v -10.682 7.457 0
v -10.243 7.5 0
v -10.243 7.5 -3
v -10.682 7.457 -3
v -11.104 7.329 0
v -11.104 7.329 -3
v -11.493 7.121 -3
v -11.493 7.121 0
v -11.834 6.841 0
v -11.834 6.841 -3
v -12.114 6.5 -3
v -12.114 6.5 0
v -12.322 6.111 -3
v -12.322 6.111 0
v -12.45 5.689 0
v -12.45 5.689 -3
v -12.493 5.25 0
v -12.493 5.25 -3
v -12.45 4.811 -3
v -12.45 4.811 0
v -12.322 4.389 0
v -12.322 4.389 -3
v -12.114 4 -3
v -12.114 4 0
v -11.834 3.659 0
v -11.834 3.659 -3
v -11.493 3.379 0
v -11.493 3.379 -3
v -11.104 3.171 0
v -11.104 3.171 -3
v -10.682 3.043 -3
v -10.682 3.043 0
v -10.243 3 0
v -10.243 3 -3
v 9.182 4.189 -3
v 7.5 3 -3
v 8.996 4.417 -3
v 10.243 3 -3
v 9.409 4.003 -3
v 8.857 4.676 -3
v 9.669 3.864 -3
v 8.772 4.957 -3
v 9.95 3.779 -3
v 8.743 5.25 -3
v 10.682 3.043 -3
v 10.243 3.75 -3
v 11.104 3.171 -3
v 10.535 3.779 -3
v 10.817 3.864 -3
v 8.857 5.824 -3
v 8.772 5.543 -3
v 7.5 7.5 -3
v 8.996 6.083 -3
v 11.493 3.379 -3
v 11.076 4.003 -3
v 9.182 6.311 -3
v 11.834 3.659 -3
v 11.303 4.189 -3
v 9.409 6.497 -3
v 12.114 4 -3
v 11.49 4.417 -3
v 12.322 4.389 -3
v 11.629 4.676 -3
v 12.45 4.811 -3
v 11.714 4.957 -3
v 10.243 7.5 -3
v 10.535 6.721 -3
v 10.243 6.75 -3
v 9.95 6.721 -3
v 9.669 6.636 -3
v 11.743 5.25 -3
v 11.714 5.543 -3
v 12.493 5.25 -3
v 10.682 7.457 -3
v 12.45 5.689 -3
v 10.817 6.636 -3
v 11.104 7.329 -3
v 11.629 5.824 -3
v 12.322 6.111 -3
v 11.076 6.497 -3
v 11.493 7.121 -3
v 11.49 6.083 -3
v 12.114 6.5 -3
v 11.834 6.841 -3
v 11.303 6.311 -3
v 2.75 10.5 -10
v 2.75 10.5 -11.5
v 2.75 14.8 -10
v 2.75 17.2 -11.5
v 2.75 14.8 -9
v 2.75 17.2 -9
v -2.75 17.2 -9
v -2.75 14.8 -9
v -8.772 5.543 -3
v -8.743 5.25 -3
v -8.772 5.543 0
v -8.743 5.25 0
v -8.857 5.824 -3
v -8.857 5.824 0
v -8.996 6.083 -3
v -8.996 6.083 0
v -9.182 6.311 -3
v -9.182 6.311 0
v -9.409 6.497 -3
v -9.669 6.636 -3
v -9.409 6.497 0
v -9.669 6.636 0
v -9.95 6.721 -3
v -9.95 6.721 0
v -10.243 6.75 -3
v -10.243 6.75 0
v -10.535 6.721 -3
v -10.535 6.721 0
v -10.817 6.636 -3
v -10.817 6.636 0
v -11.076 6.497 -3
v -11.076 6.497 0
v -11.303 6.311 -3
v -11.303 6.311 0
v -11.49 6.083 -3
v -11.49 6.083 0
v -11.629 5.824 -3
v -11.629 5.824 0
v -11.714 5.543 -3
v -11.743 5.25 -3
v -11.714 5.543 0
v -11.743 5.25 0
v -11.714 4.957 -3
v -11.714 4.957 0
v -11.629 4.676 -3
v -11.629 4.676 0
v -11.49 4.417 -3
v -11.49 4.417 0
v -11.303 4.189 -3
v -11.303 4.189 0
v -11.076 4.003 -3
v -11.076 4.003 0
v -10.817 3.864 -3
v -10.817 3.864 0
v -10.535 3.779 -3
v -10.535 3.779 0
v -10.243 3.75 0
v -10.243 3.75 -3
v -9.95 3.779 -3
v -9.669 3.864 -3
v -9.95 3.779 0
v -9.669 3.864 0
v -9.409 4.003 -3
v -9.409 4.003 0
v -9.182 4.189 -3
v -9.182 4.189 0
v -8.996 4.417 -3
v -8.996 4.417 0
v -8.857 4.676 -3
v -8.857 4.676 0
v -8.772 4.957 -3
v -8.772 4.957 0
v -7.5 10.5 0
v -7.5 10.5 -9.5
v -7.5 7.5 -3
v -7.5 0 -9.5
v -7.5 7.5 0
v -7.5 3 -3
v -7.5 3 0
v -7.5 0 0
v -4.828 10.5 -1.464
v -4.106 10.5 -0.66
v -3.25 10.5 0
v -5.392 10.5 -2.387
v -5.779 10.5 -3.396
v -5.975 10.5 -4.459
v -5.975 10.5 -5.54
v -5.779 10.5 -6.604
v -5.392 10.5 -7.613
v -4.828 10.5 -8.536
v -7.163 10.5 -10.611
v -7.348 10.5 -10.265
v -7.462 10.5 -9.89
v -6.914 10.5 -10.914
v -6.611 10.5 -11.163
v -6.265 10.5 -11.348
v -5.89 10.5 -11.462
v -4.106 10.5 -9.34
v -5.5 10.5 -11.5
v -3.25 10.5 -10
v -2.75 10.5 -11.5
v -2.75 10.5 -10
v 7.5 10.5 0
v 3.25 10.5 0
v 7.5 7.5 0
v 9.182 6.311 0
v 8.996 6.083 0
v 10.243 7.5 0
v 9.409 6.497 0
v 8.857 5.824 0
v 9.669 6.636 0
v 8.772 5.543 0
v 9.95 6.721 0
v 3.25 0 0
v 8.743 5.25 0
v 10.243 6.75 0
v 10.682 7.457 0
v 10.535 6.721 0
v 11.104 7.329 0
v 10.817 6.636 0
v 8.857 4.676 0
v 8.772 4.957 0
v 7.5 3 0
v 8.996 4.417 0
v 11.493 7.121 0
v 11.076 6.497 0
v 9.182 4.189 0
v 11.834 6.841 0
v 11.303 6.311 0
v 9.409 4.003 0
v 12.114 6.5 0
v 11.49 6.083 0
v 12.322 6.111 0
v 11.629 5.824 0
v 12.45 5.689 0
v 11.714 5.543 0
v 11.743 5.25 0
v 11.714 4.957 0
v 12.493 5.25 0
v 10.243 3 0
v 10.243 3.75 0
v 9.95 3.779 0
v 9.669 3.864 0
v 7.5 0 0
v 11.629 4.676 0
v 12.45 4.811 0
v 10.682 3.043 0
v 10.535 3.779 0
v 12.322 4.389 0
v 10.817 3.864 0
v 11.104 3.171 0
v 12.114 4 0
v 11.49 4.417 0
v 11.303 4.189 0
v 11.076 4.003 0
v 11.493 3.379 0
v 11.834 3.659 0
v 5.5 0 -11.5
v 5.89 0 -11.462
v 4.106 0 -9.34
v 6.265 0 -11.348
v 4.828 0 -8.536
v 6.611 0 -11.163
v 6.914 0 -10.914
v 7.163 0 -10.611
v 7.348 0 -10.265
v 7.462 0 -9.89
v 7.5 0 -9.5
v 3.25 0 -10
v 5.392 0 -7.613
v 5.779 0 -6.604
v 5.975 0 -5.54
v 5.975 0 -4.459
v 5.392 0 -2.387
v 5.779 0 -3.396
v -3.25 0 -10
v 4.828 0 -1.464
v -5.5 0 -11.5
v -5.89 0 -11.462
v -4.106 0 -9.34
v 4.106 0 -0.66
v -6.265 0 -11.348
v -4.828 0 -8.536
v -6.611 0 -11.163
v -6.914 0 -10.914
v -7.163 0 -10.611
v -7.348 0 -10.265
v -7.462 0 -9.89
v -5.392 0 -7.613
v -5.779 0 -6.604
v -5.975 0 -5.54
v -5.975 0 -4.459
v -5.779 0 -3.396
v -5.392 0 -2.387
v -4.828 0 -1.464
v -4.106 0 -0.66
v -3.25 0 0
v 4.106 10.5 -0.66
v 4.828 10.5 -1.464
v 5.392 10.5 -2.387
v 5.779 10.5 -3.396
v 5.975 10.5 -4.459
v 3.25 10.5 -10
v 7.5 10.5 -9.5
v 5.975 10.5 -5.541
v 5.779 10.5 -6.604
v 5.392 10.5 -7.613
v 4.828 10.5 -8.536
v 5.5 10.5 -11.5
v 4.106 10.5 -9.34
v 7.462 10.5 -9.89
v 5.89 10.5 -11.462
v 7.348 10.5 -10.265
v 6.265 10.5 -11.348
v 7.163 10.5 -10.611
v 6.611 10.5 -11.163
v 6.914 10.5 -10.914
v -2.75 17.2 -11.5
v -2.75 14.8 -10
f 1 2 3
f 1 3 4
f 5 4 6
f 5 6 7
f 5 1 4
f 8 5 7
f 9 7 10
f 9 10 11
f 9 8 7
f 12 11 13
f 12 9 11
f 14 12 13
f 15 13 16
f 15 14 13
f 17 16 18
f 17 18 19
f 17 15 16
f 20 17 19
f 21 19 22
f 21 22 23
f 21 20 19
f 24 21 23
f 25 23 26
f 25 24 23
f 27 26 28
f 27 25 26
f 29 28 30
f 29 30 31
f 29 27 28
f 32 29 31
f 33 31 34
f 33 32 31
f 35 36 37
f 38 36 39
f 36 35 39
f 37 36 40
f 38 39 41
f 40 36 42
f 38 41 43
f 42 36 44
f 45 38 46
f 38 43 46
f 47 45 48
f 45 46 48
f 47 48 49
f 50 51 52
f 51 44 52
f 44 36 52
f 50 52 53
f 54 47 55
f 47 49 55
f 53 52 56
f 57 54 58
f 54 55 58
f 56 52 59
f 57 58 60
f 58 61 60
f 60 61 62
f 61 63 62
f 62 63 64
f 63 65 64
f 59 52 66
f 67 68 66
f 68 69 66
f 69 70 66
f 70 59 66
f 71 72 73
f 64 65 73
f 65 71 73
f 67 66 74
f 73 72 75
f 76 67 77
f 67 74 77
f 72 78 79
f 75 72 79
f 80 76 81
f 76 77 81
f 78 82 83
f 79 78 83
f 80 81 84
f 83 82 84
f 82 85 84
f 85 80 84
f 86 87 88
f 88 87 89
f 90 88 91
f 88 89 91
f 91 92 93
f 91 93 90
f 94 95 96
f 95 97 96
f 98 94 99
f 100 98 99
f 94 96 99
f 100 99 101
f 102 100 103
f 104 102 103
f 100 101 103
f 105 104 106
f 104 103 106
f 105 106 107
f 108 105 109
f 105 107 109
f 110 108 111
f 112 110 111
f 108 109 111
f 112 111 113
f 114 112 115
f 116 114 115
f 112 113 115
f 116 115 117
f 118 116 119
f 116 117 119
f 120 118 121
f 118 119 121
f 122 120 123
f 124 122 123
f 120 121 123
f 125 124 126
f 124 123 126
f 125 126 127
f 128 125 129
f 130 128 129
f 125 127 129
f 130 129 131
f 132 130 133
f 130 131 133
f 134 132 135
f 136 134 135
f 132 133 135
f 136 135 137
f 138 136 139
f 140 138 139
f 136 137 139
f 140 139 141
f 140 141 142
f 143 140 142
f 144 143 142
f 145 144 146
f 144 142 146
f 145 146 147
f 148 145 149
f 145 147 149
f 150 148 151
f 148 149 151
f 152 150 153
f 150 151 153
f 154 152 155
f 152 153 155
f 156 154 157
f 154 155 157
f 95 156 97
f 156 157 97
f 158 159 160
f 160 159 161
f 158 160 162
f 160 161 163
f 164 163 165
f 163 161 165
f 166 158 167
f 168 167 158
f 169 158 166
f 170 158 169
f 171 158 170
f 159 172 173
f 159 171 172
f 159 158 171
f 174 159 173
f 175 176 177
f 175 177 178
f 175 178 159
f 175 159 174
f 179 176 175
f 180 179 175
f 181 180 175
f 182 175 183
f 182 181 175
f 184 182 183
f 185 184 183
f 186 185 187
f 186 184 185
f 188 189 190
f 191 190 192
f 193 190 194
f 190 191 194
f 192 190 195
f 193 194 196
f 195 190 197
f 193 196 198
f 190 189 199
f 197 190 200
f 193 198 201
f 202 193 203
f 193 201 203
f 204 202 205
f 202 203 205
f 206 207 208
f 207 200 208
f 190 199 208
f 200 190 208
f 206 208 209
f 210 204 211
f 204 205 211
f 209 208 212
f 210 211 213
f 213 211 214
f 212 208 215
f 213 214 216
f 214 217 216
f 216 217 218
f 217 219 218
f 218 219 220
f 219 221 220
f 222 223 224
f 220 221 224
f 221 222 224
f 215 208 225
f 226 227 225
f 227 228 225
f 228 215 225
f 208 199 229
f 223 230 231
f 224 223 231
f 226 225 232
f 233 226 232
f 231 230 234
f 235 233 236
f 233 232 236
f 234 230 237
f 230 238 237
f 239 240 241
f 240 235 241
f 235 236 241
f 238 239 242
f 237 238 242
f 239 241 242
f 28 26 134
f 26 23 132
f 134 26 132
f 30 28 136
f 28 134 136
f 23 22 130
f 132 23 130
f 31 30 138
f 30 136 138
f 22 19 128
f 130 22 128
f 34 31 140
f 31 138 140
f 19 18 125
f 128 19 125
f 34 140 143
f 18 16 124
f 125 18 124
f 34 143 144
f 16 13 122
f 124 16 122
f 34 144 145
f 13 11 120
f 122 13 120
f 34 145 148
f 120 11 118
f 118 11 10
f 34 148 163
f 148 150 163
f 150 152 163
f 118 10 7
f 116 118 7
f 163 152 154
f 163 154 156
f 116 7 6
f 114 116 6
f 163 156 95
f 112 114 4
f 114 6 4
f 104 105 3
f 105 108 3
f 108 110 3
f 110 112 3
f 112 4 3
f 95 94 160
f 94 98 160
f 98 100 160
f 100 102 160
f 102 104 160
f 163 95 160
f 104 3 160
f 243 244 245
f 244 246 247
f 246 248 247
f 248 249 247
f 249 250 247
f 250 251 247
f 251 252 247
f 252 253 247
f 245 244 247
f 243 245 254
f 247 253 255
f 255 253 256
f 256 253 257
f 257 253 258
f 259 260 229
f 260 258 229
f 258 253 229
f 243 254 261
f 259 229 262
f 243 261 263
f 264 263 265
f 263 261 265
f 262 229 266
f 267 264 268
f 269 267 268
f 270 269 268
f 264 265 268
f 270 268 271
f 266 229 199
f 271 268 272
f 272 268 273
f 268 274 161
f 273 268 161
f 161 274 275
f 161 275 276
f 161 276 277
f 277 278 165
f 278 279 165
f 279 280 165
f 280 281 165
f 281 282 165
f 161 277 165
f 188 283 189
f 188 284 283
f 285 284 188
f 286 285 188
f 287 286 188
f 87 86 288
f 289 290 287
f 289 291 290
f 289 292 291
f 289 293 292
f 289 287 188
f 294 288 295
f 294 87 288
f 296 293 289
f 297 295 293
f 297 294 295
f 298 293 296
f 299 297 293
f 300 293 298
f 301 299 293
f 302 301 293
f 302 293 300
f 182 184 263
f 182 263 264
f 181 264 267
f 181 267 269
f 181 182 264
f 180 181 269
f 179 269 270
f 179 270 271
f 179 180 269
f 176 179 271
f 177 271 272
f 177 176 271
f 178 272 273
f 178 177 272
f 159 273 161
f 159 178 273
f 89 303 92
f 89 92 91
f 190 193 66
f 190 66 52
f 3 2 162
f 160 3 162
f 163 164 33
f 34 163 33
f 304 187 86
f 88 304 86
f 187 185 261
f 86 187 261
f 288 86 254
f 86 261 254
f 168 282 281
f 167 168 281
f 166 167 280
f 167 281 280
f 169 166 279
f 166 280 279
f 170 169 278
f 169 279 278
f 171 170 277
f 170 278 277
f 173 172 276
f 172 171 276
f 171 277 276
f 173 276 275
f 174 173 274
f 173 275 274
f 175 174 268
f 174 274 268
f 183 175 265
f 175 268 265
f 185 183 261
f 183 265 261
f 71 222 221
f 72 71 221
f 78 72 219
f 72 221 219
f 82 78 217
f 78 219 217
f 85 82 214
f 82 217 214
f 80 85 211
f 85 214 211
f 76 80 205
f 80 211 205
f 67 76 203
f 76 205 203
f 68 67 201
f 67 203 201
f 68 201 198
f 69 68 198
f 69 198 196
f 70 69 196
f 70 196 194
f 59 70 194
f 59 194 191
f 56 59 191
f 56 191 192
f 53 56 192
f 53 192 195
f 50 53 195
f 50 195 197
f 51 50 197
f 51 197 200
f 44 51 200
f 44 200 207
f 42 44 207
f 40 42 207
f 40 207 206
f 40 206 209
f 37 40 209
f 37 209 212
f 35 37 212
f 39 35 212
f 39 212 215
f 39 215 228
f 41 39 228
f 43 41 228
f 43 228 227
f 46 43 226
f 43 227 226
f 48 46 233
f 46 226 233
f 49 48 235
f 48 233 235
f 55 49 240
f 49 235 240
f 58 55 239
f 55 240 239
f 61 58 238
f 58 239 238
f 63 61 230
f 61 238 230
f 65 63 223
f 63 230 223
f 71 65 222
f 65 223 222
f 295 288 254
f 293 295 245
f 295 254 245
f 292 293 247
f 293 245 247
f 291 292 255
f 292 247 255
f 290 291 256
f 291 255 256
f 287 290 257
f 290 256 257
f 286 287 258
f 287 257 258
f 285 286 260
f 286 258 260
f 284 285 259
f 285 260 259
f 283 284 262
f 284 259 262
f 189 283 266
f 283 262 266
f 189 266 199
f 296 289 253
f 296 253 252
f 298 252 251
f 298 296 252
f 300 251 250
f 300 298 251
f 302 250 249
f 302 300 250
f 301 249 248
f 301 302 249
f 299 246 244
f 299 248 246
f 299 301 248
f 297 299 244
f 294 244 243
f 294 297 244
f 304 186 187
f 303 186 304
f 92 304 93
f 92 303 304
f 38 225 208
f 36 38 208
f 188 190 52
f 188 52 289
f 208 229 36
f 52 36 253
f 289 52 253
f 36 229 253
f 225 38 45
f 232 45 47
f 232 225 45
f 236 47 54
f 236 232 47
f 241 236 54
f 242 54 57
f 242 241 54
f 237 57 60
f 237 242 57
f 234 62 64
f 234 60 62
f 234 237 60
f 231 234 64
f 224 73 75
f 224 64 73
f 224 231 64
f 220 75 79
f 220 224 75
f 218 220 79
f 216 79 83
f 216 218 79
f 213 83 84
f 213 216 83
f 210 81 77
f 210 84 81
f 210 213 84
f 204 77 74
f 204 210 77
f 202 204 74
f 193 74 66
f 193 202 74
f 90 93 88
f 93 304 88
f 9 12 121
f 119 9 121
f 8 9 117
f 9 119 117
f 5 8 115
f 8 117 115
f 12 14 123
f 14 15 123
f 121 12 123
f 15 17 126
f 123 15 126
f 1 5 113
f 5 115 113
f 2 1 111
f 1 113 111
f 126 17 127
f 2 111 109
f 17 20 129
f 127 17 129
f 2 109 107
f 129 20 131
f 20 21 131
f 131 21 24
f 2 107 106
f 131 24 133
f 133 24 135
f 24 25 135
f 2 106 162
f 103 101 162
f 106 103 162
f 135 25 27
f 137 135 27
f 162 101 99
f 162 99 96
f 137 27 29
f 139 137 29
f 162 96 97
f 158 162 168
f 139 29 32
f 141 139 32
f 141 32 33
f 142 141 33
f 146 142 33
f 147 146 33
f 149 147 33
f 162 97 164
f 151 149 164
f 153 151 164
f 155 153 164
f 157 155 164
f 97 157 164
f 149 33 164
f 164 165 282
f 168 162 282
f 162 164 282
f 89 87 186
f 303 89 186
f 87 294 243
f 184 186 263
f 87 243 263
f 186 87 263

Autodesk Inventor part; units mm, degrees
ref_plane "YZ Plane" through (0, 0, 0) normal (1, 0, 0) x (0, 1, 0)
sketch "Esboço1" plane through (0, 0, 0) normal (0, 1, 0) x (-1, 0, 0)
  line L0 (-7.5, 0) -> (-7.5, -11.5)
  line L1 (-7.5, -11.5) -> (7.5, -11.5)
  line L2 (7.5, -11.5) -> (7.5, 0)
  line L3 (-6, -10) -> (-6, 0)
  line L4 (6, 0) -> (6, -10)
  line L5 (6, -10) -> (-6, -10)
  line L6 (7.5, 0) -> (6, 0)
  line L7 (-6, 0) -> (-7.5, 0)
  arc A0 (-3.2499, 0) -> (-3.2501, -10) centre (-0.0795, -5.0001) ccw
  line L8 (-3.2501, -10) -> (3.2501, -10)
  arc A1 (3.2501, -10) -> (3.2499, 0) centre (0.0795, -5.0001) ccw
  line L9 (3.2499, 0) -> (-3.2499, 0)
  line L10 (6, -10) -> (-6, -10)
  line L11 (-6, -10) -> (-6, 0)
  line L12 (-6, 0) -> (6, 0)
  line L13 (6, 0) -> (6, -10)
  point P0 (0, 0)
  point P1 (-3.2499, 0)
  dimension "d0" = 15
  dimension "d1" = 11.5
  dimension "d2" = 1.5
  dimension "d3" = 11.5
extrude "Extrusão1" add sketch "Esboço1" along normal blind 13.5 contours L7 L3 L5 L4 L6 L2 L1 L0 | L12 A0 L3 | A0 L5 L3 | L12 L4 A1 | A1 L4 L5
sketch "Esboço2" plane through (0, 13.5, 0) normal (0, 1, 0) x (1, 0, 0)
  line L0 (-3.2501, 10) -> (3.2501, 10) projected
  line L1 (7.5, 11.5) -> (-7.5, 11.5) projected
  line L2 (-3.2501, 10) -> (3.2499, 10)
  line L3 (3.2499, 10) -> (3.2499, 11.5)
  line L4 (3.2499, 11.5) -> (-3.2501, 11.5)
  line L5 (-3.2501, 11.5) -> (-3.2501, 10)
  point P0 (0, 0)
  dimension "d8" = 6.5
extrude "Extrusão2" add sketch "Esboço2" along normal blind 5
sketch "Esboço3" plane through (-3.2501, 0, -10) normal (0, 0, 1) x (1, 0, 0)
  line L0 (0, 13.5) -> (0, 18.5) projected
  line L1 (6.5, 13.5) -> (6.5, 18.5) projected
  line L2 (0, 14.8) -> (6.5, 14.8)
  line L3 (6.5, 14.8) -> (6.5, 15.3)
  line L4 (6.5, 15.3) -> (0, 15.3)
  line L5 (0, 15.3) -> (0, 14.8)
  line L6 (6.5, 18.5) -> (0, 18.5) projected
  line L7 (0, 18.5) -> (6.5, 18.5)
  line L8 (6.5, 18.5) -> (6.5, 18)
  line L9 (6.5, 18) -> (0, 18)
  line L10 (0, 18) -> (0, 18.5)
  line L11 (0, 17.2) -> (6.5, 17.2)
  line L12 (6.5, 17.2) -> (6.5, 16.7)
  line L13 (6.5, 16.7) -> (0, 16.7)
  line L14 (0, 16.7) -> (0, 17.2)
  point P0 (3.2501, 0)
  point P1 (0, 15.3)
  point P2 (6.5, 14.8)
  point P3 (0, 16.7)
  point P4 (6.5, 17.2)
  dimension "d11" = 0.5
  dimension "d12" = 0.5
  dimension "d13" = 0.5
extrude "Extrusão3" add sketch "Esboço3" along normal blind 1 contours L0 L4 L1 L2 | L0 L6 L1 L9
extrude "Extrusão4" add sketch "Esboço3" along normal blind 0.5 contours L0 L11 L1 L13
sketch "Esboço4" plane through (0, 13.5, 0) normal (0, 1, 0) x (1, 0, 0)
  line L0 (-3.2501, 10) -> (-3.2501, 11.5) projected
  line L1 (-3.2501, 11.5) -> (-7.5, 11.5) projected
  line L2 (-7.5, 11.5) -> (-7.5, 0) projected
  line L3 (-7.5, 0) -> (-3.2499, 0) projected
  arc A0 (-3.2501, 10) -> (-3.2499, 0) centre (-0.0795, 5.0001) ccw projected
  line L4 (3.2499, 11.5) -> (3.2499, 10) projected
  line L5 (3.2499, 10) -> (3.2501, 10) projected
  arc A1 (3.2499, 0) -> (3.2501, 10) centre (0.0795, 5.0001) ccw projected
  line L6 (3.2499, 0) -> (7.5, 0) projected
  line L7 (7.5, 0) -> (7.5, 11.5) projected
  line L8 (7.5, 11.5) -> (3.2499, 11.5) projected
  line L9 (-3.2501, 9) -> (3.2499, 9) projected
  line L10 (-3.2501, 11.5) -> (-2.7501, 11.5)
  line L11 (-2.7501, 11.5) -> (-2.7501, 9)
  line L12 (-2.7501, 9) -> (-3.2501, 9)
  line L13 (-3.2501, 9) -> (-3.2501, 11.5)
  line L14 (3.2499, 11.5) -> (2.7499, 11.5)
  line L15 (2.7499, 11.5) -> (2.7499, 9)
  line L16 (2.7499, 9) -> (3.2499, 9)
  line L17 (3.2499, 9) -> (3.2499, 11.5)
  point P0 (0, 0)
  dimension "d20" = 0.5
  dimension "d21" = 0.5
extrude "Extrusão5" cut sketch "Esboço4" against normal blind 3 contours A0 L3 L2 L1 L0 | L8 L7 L6 A1 L4
sketch "Esboço5" plane through (0, 18.5, 0) normal (0, 1, 0) x (1, 0, 0)
  line L0 (-7.5, 11.5) -> (-3.2501, 11.5) projected
  line L1 (-3.2501, 9) -> (3.2499, 9) projected
  line L2 (-3.2501, 11.5) -> (-2.7501, 11.5)
  line L3 (-2.7501, 11.5) -> (-2.7501, 9)
  line L4 (-2.7501, 9) -> (-3.2501, 9)
  line L5 (-3.2501, 9) -> (-3.2501, 11.5)
  line L6 (3.2499, 11.5) -> (3.2499, 9) projected
  line L7 (3.2499, 11.5) -> (2.7499, 11.5)
  line L8 (2.7499, 11.5) -> (2.7499, 9)
  line L9 (2.7499, 9) -> (3.2499, 9)
  line L10 (3.2499, 9) -> (3.2499, 11.5)
  point P0 (0, 0)
  dimension "d22" = 0.5
  dimension "d23" = 0.5
extrude "Extrusão6" cut sketch "Esboço5" against normal up to surface (8 mm away)
sketch "Esboço6" plane through (3.2499, 0, 0) normal (0, 0, 1) x (1, 0, 0)
  point P0 (-3.2499, 0)
ref_plane "Plano de trabalho1" through (3.2499, 0, 0) normal (0, 0, 1) x (1, 0, 0)
sketch "Esboço7" plane through (3.2499, 0, 0) normal (0, 0, 1) x (1, 0, 0)
  line L0 (4.2501, 0) -> (4.2501, 10.5) projected
  line L1 (4.2501, 10.5) -> (4.2501, 0)
  circle A0 centre (6.9929, 5.2499) radius 1.5
  circle A1 centre (6.9929, 5.2499) radius 2.25
  line L2 (6.9929, 7.4999) -> (4.2501, 7.4999)
  line L3 (6.9929, 2.9999) -> (4.2501, 2.9999)
  line L4 (4.2501, 5.2499) -> (4.7429, 5.2499)
  line L5 (5.4929, 5.2499) -> (9.7501, 5.2499)
  point P0 (-3.2499, 0)
  dimension "d28" = 3
  dimension "d29" = 4.5
extrude "Extrusão7" add sketch "Esboço7" against normal blind 3
ref_plane "Plano de trabalho2" through (-7.5, 0, 0) normal (0, 0, 1) x (1, 0, 0)
sketch "Esboço8" plane through (-7.5, 0, 0) normal (0, 0, 1) x (1, 0, 0)
  circle A0 centre (17.7428, 5.2499) radius 1.5
  line L0 (15, 10.5) -> (10.7499, 10.5) projected
  line L1 (10.7499, 0) -> (10.7499, 10.5) projected
  line L2 (10.7499, 0) -> (15, 0) projected
  line L3 (15, 0) -> (15, 2.9999) projected
  line L4 (15, 2.9999) -> (17.7428, 2.9999) projected
  arc A1 (17.7428, 2.9999) -> (17.7428, 7.4999) centre (17.7428, 5.2499) ccw projected
  line L5 (17.7428, 7.4999) -> (15, 7.4999) projected
  line L6 (15, 7.4999) -> (15, 10.5) projected
  circle A2 centre (-2.7428, 5.2499) radius 1.5
  line L7 (0, 0) -> (0, 2.9999)
  line L8 (0, 2.9999) -> (-2.7428, 2.9999)
  arc A3 (-2.7428, 7.4999) -> (-2.7428, 2.9999) centre (-2.7428, 5.2499) ccw
  line L9 (-2.7428, 7.4999) -> (0, 7.4999)
  line L10 (0, 7.4999) -> (0, 10.5)
  line L11 (0, 0) -> (0, 10.5) projected
  line L12 (0, 10.5) -> (0, 0)
  point P0 (7.5, 0)
extrude "Extrusão8" add sketch "Esboço8" against normal blind 3 contours L8 A3 L9 L11
sketch "Esboço9" plane through (7.5, 0, -11.5) normal (0, 0, -1) x (-1, 0, 0)
  line L0 (10.2501, 18) -> (10.2501, 17.2) projected
  line L1 (10.2501, 17.2) -> (4.7501, 17.2) projected
  line L2 (4.7501, 17.2) -> (4.7501, 18) projected
  line L3 (4.7501, 18) -> (10.2501, 18) projected
  line L4 (10.2501, 18.5) -> (10.2501, 18) projected
  line L5 (10.2501, 18) -> (4.7501, 18) projected
  line L6 (4.7501, 18) -> (4.7501, 18.5) projected
  line L7 (4.7501, 18.5) -> (10.2501, 18.5) projected
  point P0 (7.5, 0)
extrude "Extrusão9" cut sketch "Esboço9" against normal blind 10
sketch "Esboço10" plane through (-2.7501, 15.3, -10) normal (0, 0, 1) x (1, 0, 0)
  line L0 (0, 1.4) -> (0, 0) projected
  line L1 (0, 0) -> (5.5, 0) projected
  line L2 (5.5, 0) -> (5.5, 1.4) projected
  line L3 (5.5, 1.4) -> (0, 1.4) projected
  line L4 (0, 1.9) -> (0, 1.4) projected
  line L5 (0, 1.4) -> (5.5, 1.4) projected
  line L6 (5.5, 1.4) -> (5.5, 1.9) projected
  line L7 (5.5, 1.9) -> (0, 1.9) projected
  point P0 (2.7501, -15.3)
extrude "Extrusão10" add sketch "Esboço10" along normal up to surface (1 mm away)
fillet "Arredondamento1" radius 2 2 edges at (7.5, 5.25, -11.5) (-7.5, 5.25, -11.5)
properties part number "Suporte Externo - Motor"
